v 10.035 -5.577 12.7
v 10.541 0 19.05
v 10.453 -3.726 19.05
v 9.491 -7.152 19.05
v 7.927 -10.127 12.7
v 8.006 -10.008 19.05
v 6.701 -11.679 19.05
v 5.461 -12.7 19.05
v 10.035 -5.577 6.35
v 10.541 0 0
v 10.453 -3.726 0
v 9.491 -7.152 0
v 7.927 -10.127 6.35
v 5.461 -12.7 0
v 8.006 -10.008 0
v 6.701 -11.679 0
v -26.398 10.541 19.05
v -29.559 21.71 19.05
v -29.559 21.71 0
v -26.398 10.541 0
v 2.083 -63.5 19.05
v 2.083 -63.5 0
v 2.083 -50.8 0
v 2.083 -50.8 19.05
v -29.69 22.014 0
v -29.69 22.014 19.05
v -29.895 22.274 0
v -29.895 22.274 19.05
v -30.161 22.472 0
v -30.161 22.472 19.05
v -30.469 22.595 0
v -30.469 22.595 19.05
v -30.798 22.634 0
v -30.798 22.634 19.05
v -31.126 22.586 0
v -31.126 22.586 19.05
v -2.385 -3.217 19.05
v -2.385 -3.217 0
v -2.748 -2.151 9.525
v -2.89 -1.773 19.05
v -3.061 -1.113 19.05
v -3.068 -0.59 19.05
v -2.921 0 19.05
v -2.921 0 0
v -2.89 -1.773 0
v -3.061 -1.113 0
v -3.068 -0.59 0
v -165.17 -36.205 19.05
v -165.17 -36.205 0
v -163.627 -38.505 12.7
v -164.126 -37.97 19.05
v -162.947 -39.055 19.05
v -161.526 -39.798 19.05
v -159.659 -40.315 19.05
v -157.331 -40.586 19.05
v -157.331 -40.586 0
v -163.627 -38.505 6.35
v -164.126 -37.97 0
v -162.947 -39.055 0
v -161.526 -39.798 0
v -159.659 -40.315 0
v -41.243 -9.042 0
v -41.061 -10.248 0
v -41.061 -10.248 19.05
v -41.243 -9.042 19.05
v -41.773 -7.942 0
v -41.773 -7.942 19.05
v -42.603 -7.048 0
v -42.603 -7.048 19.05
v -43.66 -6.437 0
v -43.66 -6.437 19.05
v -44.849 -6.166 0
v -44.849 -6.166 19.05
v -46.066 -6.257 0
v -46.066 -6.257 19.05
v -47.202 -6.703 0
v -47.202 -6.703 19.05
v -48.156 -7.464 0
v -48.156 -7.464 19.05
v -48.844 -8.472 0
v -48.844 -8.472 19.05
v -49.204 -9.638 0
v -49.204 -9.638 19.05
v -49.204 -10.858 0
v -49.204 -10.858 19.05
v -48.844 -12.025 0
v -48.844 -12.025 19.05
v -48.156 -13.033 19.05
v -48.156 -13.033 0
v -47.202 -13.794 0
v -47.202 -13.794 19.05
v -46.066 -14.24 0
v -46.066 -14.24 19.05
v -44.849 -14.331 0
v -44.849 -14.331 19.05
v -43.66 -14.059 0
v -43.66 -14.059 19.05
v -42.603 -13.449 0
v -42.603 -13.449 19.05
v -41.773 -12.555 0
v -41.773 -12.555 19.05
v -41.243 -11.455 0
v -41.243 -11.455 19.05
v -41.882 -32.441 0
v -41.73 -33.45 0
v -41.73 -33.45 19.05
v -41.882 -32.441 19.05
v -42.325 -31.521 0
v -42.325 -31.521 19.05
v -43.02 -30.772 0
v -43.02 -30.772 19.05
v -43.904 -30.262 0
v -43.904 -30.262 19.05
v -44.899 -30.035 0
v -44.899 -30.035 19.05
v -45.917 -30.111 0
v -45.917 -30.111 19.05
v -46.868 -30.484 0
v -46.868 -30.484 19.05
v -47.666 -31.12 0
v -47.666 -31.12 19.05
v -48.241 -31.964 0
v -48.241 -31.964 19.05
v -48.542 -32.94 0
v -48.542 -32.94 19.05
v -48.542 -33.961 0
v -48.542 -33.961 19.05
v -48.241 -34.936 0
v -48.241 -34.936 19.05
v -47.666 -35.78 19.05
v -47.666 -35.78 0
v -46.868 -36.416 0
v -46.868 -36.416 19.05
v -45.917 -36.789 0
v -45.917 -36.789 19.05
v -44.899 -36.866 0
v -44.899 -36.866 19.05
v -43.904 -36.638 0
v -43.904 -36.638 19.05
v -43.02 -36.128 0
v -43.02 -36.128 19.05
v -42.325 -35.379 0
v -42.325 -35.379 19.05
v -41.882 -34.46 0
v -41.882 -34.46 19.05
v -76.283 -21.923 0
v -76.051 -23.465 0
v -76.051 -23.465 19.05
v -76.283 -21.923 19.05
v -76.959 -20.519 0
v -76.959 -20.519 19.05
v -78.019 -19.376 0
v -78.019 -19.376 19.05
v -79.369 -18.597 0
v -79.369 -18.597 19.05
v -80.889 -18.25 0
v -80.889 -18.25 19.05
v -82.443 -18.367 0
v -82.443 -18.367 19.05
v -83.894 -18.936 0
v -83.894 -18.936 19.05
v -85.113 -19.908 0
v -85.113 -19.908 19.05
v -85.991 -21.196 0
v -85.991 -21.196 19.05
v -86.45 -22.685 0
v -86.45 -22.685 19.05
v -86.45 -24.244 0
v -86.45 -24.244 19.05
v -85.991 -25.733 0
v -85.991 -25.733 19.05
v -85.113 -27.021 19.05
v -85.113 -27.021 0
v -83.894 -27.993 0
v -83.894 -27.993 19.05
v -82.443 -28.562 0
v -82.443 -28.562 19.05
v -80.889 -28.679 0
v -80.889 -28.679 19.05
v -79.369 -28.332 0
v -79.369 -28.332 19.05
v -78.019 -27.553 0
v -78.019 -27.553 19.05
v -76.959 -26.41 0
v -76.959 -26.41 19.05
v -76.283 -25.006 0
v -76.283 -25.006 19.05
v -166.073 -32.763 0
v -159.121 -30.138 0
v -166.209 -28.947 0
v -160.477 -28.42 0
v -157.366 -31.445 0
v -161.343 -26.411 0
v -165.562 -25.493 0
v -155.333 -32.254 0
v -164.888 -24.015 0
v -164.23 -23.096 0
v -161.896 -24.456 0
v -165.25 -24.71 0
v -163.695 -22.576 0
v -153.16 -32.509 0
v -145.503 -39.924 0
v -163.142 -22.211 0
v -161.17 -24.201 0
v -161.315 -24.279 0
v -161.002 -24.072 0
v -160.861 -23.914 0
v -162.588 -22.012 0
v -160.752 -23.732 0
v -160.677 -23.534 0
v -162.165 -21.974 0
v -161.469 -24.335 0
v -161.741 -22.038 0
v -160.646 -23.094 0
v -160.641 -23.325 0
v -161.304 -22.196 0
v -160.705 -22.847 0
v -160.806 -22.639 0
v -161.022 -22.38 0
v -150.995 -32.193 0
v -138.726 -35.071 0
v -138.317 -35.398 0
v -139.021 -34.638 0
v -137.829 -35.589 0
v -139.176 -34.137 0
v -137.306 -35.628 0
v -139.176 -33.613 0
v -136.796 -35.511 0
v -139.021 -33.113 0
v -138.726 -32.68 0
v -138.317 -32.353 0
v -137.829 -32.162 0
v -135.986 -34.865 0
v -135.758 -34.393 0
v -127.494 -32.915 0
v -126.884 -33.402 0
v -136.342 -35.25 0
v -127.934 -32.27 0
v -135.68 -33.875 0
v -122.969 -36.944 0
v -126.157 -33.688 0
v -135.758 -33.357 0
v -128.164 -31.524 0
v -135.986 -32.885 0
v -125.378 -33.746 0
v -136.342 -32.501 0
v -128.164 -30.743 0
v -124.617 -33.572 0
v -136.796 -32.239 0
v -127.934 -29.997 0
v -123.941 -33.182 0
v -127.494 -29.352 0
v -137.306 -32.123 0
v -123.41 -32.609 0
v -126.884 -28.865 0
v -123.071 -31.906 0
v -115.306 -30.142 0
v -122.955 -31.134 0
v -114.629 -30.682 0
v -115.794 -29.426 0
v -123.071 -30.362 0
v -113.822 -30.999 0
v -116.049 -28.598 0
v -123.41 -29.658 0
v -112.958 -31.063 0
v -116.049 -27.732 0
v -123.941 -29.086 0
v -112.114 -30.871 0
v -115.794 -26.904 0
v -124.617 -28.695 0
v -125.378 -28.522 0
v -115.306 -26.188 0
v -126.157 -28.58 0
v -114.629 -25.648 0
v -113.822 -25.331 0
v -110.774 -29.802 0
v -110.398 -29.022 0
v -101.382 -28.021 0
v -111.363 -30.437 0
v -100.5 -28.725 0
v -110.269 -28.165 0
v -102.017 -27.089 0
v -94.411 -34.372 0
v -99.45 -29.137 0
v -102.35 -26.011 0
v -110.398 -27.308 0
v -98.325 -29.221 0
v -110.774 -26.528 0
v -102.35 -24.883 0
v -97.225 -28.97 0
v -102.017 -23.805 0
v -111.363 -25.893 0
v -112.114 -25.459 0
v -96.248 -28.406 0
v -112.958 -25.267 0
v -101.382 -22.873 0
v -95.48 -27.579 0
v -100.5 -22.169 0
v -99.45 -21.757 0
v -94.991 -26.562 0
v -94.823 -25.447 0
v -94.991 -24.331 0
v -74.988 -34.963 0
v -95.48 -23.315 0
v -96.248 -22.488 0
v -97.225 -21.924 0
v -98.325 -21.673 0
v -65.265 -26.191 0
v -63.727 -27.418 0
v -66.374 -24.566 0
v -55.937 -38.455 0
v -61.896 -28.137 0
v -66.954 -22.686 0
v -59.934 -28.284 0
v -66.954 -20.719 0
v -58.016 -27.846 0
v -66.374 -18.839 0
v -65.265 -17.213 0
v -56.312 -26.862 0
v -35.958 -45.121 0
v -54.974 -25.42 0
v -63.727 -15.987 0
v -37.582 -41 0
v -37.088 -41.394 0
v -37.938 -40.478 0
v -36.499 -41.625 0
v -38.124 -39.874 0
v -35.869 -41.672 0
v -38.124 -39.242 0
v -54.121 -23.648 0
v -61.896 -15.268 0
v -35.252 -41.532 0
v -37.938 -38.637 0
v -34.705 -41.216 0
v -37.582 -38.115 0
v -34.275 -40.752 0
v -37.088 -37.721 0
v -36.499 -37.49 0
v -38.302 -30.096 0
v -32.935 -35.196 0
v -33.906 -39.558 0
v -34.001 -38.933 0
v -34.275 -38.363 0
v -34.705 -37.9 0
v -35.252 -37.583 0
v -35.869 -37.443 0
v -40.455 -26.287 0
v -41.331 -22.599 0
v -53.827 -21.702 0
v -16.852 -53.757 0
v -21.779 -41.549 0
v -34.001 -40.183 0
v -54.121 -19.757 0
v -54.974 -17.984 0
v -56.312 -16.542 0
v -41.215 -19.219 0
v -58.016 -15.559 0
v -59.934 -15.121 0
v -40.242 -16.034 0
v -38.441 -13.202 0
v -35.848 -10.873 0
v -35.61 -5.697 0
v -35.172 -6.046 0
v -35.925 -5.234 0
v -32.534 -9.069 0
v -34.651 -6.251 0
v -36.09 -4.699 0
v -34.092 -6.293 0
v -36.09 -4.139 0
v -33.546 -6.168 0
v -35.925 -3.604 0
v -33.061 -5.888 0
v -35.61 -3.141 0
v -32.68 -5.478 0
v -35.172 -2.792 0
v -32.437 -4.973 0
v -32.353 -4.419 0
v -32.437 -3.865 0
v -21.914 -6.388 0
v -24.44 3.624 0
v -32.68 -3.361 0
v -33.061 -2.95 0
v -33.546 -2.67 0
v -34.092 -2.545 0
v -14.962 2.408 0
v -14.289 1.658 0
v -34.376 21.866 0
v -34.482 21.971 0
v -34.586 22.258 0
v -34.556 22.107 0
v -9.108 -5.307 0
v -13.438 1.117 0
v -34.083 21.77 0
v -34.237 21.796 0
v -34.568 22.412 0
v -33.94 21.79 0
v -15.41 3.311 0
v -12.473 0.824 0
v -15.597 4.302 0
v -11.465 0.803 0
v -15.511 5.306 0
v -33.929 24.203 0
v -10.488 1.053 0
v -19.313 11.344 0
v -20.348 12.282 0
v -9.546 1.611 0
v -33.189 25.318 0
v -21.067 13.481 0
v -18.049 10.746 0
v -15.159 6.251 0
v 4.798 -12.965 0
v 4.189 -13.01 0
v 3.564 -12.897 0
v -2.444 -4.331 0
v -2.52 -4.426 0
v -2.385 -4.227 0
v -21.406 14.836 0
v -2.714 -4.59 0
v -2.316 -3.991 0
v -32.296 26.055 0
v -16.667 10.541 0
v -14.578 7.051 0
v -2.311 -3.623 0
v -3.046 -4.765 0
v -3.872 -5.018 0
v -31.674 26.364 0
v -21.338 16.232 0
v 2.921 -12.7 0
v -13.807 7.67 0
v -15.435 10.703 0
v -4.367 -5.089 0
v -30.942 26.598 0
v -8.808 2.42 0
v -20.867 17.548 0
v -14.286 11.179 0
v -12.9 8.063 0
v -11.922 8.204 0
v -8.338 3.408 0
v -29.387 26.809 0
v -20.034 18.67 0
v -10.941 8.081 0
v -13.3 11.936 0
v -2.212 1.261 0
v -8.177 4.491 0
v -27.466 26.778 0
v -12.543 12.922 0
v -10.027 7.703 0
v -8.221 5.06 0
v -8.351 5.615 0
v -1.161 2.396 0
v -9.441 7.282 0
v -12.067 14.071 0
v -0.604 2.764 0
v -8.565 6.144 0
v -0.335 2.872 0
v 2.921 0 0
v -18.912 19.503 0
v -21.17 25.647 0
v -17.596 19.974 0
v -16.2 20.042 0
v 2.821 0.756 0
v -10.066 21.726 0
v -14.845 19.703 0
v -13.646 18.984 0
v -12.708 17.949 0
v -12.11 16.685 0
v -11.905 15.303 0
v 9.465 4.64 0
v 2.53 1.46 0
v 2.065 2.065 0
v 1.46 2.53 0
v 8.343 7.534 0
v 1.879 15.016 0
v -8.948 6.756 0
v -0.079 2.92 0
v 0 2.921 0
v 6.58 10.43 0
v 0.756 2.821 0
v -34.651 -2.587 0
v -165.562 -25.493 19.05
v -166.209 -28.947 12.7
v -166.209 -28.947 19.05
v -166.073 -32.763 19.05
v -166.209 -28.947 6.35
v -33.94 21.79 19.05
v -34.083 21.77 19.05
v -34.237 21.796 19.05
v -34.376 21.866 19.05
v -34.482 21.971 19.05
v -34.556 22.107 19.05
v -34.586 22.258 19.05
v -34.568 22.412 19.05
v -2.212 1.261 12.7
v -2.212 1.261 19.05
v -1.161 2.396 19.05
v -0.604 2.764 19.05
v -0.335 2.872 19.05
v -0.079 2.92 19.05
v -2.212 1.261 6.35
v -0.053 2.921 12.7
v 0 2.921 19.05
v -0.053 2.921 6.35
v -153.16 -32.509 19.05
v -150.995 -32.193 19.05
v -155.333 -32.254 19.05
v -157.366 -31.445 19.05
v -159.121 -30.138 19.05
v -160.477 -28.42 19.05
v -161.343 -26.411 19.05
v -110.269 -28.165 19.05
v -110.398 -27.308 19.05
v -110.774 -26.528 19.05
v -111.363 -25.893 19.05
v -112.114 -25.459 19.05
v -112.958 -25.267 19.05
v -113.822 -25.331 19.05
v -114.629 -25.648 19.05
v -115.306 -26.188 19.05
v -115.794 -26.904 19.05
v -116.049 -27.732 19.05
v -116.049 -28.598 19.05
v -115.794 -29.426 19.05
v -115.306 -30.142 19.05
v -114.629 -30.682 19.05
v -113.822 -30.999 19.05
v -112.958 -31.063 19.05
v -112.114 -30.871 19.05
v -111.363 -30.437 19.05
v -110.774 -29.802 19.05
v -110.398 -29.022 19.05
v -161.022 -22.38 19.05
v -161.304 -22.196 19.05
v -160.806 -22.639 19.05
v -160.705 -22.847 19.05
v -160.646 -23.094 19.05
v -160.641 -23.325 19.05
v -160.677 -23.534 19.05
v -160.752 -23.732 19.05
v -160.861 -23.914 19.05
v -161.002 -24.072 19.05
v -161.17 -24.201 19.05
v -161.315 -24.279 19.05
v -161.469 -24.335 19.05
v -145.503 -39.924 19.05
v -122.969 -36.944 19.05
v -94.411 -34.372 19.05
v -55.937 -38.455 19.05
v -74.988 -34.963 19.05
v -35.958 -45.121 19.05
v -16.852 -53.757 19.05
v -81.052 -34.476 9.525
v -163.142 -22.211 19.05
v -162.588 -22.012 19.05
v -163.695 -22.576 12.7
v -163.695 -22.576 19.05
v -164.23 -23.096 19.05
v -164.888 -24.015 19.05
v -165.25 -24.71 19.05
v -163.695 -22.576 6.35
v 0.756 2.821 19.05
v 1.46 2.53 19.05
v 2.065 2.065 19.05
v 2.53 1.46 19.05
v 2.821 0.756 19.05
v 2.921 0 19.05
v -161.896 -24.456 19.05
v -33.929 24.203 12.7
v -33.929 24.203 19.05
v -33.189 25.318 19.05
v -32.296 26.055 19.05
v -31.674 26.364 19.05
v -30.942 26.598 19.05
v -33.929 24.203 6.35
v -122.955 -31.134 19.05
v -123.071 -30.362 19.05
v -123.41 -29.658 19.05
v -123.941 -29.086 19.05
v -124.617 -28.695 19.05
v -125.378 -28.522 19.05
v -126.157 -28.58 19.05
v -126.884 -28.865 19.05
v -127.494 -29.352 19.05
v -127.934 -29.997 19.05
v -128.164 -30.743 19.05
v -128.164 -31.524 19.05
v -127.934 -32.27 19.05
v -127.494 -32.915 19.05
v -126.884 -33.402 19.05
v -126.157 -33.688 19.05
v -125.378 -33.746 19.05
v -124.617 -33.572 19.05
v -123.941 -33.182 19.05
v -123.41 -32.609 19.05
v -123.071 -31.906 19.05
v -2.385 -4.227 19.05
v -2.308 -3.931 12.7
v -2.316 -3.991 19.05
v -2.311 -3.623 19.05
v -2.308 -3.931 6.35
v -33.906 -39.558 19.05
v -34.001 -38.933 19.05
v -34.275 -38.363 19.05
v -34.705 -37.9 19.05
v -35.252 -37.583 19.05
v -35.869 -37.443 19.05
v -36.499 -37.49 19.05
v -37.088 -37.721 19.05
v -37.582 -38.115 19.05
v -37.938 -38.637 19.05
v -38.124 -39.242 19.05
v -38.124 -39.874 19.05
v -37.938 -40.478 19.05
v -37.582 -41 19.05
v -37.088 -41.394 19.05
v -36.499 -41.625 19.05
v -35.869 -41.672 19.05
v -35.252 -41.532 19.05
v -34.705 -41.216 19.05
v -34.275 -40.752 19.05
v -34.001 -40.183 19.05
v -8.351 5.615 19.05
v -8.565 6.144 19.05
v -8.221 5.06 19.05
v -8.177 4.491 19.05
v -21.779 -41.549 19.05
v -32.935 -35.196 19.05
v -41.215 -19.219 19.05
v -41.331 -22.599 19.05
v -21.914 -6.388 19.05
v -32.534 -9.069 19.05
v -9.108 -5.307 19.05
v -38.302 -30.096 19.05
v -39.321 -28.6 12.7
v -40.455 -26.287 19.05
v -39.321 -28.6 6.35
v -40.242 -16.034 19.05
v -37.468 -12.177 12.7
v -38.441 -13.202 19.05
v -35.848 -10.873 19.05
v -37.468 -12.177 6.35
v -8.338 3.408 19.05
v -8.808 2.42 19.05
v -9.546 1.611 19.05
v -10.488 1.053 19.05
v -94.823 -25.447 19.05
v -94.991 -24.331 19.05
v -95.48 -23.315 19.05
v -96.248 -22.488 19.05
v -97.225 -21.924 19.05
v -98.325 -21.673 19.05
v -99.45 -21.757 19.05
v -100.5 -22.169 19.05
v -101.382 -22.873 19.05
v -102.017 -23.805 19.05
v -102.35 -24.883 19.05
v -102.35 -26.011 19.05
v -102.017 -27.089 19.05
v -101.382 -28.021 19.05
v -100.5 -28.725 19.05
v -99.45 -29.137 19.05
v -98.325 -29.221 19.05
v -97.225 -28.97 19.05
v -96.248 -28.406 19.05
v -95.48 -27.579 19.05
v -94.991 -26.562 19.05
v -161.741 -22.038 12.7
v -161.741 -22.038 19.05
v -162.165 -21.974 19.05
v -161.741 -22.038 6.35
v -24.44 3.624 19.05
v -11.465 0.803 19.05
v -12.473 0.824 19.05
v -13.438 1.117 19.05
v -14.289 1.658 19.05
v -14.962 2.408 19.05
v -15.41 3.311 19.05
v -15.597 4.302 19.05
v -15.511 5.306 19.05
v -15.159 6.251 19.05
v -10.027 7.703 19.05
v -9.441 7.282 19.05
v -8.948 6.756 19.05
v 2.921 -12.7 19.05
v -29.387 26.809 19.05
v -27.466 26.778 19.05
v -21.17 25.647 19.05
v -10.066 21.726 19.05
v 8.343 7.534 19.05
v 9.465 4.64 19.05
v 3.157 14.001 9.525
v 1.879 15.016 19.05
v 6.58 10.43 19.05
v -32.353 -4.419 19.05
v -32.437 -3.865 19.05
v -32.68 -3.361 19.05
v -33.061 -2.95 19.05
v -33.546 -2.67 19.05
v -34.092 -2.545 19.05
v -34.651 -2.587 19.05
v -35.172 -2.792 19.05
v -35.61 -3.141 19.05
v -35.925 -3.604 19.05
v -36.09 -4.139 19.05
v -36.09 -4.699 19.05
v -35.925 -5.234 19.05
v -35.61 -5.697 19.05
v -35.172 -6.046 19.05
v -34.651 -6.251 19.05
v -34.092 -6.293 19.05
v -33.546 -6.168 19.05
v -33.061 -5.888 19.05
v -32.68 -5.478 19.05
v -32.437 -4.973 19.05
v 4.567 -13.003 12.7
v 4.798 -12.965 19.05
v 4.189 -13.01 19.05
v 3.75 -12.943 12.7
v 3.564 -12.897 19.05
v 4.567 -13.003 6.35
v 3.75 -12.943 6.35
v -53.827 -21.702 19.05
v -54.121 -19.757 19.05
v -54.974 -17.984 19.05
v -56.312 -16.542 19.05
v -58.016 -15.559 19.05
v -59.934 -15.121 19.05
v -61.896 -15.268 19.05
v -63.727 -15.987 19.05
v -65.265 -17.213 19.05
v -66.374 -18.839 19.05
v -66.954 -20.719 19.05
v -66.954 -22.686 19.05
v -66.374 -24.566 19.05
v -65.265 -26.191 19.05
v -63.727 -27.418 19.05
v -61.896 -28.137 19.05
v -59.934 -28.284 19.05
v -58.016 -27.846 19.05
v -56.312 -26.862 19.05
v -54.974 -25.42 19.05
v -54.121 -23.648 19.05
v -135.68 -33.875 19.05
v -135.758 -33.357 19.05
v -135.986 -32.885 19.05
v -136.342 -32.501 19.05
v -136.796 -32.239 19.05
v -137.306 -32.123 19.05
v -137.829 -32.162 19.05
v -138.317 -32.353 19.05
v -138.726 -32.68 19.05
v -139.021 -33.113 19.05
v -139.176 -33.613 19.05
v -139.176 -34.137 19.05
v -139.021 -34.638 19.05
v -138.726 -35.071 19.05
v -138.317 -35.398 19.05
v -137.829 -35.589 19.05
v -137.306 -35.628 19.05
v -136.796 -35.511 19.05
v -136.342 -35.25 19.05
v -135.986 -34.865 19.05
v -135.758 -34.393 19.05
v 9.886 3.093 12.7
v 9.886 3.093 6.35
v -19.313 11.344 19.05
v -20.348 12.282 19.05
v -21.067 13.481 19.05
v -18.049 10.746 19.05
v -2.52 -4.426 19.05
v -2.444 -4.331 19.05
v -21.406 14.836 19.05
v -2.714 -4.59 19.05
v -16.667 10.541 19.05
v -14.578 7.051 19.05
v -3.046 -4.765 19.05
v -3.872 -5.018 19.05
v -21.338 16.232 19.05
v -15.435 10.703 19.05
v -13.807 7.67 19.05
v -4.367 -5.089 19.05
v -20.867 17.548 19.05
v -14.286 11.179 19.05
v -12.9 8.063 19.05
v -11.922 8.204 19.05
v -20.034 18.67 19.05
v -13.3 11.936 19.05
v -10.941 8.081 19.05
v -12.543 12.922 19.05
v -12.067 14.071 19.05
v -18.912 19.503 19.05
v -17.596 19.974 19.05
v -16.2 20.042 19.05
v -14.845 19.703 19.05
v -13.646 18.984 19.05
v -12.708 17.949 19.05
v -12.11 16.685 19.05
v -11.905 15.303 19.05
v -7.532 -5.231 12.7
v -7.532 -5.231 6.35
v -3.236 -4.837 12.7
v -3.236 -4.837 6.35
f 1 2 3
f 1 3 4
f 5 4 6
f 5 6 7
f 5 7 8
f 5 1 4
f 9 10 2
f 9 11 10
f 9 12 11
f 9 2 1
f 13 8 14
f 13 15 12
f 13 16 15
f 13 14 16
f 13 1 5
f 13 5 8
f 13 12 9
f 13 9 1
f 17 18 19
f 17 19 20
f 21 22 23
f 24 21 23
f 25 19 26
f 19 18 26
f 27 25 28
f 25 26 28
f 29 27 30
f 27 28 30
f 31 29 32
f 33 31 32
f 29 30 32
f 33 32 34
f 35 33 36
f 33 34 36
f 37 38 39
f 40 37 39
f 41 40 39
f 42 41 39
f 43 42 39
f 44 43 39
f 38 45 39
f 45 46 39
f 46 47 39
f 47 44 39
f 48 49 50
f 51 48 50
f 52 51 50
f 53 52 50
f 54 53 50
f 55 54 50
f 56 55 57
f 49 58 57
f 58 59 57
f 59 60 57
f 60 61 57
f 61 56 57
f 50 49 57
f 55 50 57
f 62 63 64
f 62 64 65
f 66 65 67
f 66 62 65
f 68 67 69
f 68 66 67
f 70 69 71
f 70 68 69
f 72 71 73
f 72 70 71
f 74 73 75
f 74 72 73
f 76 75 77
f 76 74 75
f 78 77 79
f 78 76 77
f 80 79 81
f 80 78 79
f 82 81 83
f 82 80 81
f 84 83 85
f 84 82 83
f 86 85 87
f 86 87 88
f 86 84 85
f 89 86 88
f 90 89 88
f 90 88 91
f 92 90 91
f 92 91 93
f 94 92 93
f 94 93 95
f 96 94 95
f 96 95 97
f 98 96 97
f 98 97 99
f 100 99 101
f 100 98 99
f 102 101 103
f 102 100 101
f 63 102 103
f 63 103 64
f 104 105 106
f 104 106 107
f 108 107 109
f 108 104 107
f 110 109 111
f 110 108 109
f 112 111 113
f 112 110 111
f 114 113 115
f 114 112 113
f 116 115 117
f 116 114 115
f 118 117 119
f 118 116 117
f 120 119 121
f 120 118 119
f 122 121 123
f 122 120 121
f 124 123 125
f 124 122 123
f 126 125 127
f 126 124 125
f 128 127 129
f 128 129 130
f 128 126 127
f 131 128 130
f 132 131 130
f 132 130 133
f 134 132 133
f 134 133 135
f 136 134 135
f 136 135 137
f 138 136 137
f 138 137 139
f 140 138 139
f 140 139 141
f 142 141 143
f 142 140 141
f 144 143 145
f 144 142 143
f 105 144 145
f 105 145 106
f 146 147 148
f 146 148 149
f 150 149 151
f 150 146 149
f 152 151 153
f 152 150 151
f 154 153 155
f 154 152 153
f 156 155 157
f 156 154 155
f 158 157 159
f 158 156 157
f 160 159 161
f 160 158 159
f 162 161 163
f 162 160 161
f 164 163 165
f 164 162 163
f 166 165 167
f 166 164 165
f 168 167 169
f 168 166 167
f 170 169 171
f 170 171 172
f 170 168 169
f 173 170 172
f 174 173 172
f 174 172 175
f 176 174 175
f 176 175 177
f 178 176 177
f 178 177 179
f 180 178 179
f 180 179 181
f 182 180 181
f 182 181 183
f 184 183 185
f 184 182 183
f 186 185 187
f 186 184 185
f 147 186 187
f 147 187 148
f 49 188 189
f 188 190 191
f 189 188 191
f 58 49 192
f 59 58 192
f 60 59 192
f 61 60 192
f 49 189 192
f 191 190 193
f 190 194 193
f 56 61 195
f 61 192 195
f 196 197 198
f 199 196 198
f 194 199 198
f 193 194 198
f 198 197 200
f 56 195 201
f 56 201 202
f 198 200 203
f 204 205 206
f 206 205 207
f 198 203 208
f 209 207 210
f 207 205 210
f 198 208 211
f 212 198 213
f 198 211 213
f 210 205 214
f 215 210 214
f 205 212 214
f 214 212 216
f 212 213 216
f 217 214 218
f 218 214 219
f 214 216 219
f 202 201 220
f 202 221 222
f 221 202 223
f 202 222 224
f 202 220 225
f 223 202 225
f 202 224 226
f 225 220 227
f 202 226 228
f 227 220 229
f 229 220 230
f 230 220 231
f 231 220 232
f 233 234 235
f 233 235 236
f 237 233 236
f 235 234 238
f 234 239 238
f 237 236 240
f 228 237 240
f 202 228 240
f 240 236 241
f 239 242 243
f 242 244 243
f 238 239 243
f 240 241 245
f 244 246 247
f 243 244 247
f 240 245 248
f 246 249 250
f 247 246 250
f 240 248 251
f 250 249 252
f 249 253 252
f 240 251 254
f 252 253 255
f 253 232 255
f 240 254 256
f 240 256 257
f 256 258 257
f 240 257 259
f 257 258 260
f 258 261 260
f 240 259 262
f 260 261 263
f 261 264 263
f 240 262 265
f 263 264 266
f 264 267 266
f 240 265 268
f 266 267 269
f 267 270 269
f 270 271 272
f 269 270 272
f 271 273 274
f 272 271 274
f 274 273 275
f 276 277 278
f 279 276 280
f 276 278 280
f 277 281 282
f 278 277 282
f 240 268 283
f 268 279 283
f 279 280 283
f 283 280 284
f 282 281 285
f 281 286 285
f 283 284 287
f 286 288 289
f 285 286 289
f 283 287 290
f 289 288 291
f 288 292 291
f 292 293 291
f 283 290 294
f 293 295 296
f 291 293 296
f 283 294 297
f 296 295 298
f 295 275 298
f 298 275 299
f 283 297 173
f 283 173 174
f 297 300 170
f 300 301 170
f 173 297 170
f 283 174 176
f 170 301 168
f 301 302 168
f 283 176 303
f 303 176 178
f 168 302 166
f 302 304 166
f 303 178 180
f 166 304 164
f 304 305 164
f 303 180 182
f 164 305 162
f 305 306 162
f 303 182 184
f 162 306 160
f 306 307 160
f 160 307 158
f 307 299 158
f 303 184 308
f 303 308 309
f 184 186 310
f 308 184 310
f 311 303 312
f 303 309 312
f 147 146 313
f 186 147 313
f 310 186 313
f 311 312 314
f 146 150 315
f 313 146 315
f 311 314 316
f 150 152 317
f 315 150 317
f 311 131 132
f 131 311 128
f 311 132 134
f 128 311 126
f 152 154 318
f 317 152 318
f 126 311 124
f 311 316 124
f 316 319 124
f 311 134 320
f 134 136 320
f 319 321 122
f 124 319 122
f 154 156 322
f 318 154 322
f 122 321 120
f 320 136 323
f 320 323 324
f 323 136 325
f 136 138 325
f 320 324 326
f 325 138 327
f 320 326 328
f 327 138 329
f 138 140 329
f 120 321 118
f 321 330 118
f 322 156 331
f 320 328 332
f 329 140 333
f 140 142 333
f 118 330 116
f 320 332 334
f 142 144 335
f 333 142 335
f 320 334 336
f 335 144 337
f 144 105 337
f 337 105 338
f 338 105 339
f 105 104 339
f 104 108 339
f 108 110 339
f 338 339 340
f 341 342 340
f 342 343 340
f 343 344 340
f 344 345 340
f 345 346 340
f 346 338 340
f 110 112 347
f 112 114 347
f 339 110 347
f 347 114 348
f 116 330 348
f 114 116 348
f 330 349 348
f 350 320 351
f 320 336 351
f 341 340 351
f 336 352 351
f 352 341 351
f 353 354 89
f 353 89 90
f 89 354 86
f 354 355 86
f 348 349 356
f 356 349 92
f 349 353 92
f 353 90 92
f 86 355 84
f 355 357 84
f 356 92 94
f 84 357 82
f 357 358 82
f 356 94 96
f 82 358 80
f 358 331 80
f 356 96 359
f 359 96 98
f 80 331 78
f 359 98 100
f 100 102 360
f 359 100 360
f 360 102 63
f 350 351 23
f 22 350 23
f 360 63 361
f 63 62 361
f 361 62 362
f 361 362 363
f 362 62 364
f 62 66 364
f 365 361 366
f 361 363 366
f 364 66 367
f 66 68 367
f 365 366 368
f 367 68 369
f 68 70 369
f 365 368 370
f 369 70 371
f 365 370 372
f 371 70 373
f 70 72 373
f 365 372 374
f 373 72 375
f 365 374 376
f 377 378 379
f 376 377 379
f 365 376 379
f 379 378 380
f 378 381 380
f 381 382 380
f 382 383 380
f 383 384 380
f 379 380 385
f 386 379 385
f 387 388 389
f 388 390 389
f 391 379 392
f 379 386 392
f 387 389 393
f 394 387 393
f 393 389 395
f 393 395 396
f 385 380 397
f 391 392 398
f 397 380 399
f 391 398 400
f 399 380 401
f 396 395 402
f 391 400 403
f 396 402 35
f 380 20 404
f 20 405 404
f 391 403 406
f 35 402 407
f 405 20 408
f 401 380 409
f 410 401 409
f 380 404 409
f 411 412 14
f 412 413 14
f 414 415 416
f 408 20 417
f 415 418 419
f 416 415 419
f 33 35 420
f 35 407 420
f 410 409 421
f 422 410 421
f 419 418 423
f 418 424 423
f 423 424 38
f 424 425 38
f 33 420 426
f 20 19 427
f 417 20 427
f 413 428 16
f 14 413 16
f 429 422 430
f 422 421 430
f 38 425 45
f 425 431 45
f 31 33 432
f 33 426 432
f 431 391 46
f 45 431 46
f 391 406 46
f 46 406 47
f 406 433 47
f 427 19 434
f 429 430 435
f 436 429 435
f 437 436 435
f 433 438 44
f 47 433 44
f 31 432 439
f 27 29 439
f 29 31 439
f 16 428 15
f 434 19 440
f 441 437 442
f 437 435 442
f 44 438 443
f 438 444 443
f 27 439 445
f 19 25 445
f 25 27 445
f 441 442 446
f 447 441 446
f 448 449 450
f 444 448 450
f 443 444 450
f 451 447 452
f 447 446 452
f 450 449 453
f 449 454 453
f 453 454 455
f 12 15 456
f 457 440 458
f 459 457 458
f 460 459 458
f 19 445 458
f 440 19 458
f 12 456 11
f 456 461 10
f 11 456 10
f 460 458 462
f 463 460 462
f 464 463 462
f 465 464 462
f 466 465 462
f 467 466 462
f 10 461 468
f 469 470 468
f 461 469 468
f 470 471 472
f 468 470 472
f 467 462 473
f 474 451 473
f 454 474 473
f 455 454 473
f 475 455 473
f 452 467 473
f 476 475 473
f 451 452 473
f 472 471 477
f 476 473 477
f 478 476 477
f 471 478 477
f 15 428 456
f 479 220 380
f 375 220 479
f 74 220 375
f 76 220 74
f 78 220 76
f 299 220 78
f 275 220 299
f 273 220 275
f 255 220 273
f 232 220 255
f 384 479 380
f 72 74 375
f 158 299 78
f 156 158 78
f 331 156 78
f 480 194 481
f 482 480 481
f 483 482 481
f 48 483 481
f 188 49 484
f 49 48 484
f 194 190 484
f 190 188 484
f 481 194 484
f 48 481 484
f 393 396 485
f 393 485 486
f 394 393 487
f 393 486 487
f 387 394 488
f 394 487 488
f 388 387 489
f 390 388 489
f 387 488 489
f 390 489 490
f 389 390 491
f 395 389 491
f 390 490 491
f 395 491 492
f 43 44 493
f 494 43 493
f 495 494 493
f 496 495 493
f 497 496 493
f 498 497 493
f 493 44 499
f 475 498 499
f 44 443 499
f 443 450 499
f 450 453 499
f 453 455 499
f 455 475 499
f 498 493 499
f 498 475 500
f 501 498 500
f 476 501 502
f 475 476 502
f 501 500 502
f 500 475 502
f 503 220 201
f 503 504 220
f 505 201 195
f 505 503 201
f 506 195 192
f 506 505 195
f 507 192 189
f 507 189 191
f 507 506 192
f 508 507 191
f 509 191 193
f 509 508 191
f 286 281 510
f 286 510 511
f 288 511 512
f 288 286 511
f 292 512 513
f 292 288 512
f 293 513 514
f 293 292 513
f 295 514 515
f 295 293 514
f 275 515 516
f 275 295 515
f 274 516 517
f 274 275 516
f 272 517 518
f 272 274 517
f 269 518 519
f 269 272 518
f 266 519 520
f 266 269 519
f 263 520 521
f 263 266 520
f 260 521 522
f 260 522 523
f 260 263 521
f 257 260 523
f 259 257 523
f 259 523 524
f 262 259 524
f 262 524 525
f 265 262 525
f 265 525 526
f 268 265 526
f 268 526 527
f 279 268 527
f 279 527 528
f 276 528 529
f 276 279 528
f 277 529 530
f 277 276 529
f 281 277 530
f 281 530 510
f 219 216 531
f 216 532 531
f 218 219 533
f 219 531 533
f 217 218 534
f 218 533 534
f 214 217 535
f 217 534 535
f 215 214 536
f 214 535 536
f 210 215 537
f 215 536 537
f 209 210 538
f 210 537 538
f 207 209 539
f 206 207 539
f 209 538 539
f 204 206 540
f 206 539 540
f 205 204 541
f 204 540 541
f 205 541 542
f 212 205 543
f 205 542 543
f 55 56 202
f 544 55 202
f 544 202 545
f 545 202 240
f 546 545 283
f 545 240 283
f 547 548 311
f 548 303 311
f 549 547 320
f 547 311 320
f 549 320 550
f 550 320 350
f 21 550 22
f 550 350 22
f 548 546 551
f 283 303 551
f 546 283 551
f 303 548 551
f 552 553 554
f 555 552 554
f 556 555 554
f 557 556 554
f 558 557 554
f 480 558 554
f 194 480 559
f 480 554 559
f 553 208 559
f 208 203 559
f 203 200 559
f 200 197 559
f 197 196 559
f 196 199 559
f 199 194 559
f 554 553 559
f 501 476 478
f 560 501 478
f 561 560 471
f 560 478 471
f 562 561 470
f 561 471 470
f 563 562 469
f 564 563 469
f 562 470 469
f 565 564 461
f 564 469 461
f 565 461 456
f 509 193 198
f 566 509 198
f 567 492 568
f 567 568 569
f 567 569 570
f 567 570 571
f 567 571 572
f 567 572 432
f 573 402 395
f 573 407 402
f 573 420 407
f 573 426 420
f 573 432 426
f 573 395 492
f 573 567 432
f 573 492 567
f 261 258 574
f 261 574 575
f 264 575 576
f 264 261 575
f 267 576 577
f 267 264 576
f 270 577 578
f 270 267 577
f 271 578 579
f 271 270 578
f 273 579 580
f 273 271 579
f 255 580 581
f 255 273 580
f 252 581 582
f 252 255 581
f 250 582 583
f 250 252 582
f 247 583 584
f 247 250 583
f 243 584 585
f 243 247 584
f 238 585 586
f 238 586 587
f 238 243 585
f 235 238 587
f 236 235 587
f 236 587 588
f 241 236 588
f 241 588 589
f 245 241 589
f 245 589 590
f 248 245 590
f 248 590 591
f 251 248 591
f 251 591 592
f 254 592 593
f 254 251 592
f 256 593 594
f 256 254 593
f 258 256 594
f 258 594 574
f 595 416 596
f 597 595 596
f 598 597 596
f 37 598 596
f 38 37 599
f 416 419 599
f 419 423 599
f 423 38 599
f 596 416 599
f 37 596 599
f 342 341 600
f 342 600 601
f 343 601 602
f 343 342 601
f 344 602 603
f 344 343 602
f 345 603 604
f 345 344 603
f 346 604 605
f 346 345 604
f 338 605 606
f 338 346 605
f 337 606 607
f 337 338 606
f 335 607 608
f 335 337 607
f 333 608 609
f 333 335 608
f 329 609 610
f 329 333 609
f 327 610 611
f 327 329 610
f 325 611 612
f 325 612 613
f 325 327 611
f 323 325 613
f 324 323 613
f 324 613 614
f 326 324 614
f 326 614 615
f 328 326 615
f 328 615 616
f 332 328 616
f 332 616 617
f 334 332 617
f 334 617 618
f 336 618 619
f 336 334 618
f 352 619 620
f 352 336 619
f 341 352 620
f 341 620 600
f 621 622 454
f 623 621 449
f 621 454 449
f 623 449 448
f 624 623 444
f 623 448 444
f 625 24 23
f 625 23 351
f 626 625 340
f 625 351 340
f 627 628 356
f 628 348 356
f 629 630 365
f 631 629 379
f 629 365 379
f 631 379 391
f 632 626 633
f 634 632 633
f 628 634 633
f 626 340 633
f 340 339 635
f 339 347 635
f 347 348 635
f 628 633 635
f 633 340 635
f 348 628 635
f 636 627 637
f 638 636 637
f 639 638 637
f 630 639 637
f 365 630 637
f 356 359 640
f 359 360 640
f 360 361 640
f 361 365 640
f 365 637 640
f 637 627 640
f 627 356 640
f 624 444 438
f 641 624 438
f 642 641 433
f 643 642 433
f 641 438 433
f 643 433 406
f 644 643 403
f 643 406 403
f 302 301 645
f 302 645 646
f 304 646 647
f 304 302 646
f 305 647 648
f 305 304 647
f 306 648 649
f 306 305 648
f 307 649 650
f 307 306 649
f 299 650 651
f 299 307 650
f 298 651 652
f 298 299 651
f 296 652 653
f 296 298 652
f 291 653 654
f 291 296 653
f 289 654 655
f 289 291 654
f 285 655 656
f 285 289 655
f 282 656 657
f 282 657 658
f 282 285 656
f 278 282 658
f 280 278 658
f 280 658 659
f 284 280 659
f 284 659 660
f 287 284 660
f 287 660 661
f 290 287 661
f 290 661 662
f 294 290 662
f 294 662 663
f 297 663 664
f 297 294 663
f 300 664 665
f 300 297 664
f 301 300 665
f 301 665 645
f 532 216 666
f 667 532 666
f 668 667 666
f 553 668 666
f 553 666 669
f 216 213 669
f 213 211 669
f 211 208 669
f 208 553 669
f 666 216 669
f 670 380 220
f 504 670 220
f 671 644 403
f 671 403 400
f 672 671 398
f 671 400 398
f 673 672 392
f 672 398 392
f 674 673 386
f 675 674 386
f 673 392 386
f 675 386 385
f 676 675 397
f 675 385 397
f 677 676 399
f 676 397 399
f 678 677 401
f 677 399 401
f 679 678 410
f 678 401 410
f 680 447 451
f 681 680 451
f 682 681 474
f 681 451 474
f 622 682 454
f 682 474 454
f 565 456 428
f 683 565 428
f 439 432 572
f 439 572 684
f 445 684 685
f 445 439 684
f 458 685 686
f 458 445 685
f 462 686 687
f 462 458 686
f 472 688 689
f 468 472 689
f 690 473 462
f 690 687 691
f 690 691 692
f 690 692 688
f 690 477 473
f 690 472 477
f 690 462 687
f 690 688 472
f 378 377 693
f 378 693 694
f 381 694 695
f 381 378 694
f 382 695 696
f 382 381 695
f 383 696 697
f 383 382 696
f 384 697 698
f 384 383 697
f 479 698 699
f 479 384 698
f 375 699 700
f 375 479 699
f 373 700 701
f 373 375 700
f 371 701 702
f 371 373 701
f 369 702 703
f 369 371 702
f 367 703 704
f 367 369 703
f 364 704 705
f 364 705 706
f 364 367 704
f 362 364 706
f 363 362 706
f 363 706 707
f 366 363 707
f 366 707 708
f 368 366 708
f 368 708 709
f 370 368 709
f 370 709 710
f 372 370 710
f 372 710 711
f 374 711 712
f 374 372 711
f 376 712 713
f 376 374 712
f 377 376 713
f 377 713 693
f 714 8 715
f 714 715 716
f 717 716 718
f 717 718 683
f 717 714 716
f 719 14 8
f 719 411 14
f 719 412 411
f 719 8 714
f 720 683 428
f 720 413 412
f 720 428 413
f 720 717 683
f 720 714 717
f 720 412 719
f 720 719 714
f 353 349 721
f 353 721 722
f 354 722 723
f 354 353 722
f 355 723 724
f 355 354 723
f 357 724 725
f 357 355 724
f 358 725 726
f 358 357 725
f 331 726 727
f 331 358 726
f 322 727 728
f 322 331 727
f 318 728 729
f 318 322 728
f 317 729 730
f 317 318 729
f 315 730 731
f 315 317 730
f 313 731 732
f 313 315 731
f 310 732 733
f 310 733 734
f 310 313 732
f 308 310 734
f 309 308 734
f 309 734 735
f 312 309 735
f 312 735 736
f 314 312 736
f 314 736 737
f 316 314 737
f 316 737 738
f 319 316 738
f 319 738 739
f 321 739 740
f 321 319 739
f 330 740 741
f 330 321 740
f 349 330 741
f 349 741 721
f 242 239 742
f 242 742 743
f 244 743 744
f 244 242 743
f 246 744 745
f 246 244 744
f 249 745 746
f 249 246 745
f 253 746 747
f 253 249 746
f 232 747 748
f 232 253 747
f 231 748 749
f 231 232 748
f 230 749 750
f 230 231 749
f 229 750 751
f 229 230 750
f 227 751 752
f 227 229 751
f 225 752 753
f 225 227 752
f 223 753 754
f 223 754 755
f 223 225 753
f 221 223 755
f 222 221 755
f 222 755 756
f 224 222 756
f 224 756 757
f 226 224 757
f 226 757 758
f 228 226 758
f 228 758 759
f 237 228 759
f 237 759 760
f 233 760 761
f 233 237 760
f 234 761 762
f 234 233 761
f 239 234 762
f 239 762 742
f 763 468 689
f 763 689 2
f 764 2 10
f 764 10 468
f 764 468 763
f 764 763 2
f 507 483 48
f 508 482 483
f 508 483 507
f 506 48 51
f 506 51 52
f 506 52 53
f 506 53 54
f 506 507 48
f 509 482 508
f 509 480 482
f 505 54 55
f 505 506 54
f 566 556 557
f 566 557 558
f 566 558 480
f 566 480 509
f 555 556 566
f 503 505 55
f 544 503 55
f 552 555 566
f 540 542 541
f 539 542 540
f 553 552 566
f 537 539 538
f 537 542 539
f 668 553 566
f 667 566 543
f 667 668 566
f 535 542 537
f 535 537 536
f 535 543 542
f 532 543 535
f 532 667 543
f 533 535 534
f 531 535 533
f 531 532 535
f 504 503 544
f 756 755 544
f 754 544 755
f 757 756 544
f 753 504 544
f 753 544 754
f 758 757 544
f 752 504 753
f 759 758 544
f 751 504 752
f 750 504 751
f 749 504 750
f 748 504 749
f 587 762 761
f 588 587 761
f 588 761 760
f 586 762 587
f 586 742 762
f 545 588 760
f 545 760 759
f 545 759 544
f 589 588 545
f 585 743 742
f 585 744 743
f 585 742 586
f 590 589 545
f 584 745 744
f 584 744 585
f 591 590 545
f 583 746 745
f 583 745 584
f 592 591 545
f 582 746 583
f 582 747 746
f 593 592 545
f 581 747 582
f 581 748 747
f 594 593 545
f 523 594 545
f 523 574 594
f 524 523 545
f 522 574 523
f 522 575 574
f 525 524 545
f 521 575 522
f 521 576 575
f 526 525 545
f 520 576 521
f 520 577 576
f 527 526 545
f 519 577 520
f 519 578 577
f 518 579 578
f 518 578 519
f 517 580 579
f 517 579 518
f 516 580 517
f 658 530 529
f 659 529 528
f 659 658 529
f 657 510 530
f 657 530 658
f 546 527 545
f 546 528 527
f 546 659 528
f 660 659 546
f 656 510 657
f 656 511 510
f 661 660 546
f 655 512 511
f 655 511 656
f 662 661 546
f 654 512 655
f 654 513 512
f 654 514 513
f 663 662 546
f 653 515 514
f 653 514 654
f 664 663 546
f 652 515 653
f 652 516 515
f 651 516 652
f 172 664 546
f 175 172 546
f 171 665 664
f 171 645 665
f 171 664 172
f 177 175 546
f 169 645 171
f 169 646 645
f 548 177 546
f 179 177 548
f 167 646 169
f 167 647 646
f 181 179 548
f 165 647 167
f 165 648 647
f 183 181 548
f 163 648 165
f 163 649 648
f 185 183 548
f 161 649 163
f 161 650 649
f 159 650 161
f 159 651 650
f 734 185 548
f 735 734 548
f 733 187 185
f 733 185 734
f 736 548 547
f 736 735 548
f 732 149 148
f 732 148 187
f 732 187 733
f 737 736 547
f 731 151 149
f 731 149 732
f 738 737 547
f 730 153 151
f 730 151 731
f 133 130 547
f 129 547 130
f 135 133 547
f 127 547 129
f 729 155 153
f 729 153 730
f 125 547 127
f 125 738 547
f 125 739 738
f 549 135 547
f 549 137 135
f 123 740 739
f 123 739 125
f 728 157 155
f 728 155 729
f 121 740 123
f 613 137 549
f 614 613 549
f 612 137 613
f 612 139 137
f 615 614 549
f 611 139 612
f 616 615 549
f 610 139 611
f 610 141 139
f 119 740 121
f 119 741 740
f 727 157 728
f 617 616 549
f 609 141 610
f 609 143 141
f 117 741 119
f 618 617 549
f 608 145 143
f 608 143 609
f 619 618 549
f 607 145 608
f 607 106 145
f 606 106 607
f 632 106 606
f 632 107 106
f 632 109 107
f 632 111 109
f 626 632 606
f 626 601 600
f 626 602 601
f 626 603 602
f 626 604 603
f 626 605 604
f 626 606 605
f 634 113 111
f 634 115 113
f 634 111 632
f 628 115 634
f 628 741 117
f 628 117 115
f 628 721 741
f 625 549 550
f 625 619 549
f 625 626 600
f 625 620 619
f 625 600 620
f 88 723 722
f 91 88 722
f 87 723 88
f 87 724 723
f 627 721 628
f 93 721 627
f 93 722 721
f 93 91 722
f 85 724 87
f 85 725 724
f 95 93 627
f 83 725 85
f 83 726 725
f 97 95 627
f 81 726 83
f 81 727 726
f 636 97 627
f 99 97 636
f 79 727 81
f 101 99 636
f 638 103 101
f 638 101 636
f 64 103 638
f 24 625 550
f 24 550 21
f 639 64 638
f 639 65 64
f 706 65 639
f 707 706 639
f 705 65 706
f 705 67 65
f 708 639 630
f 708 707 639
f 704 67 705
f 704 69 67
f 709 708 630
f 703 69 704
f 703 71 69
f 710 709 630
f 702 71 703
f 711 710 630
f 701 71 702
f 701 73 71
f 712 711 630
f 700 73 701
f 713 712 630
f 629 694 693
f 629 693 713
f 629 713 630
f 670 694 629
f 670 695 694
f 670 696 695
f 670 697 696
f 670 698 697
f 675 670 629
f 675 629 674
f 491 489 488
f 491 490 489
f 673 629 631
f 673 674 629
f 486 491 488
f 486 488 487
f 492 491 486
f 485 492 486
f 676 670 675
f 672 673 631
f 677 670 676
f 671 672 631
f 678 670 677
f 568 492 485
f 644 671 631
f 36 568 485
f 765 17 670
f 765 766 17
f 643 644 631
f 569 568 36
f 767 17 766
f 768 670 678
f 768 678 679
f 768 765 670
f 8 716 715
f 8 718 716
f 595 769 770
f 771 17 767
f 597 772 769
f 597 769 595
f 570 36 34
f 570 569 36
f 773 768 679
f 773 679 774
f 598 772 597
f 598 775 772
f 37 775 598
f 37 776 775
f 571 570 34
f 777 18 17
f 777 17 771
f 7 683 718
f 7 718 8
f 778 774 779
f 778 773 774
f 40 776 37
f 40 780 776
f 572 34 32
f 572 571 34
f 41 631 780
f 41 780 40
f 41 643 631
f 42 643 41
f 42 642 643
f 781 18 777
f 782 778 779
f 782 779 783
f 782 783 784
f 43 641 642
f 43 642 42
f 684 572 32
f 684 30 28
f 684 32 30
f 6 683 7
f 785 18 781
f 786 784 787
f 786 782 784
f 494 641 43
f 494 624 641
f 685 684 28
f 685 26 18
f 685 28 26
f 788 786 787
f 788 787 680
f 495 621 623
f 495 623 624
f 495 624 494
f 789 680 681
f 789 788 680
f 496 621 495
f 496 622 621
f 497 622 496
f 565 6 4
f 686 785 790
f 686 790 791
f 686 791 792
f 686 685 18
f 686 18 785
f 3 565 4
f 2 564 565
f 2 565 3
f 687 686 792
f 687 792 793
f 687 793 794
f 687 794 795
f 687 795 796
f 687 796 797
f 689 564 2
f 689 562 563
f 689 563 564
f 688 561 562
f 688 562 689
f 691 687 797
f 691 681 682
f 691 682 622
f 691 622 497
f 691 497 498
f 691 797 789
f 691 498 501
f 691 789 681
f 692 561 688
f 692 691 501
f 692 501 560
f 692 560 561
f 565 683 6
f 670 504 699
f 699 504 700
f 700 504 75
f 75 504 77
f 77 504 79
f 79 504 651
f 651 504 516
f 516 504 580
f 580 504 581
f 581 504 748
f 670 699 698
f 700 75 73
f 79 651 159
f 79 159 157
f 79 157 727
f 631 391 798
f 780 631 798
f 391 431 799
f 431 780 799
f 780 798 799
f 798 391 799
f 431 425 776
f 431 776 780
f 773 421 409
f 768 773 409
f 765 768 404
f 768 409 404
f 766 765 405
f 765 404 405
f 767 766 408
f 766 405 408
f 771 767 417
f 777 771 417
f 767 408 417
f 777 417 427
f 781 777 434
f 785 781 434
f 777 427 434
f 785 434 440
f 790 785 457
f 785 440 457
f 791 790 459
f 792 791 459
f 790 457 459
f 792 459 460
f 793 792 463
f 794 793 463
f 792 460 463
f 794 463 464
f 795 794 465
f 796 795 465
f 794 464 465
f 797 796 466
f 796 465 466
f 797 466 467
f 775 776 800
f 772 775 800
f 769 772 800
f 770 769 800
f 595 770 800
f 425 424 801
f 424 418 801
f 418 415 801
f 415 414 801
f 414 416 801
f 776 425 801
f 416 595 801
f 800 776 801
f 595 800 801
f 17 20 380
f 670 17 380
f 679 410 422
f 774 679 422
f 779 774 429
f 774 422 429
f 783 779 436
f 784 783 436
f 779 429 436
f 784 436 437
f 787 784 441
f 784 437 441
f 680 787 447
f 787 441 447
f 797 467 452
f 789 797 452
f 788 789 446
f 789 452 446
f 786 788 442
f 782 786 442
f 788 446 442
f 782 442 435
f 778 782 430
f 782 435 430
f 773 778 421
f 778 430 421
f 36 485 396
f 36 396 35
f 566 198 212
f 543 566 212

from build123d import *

# Parameters (mm, degrees)
F0_R     = 1.7576231228
F0_R_2   = 2.6194646955
F0_R_3   = 2.9064395042
F0_R_4   = 3.7846862671
F0_R_5   = 5.2290610065
F0_R_6   = 2.1208004667
F0_R_7   = 3.4250228461
F0_R_8   = 6.5999331713
F0_R_9   = 4.0939669446
F0_R_10  = 1.8790687222
F1_DEPTH = 19.05
F2_R     = 8.382
F3_R     = 1.27
F4_R     = 0.508
F5_R     = 2.54
F6_R     = 1.143


# Not quite as in the source:
# - a feature names something its author has since deleted; it is built from what else it names


with BuildPart() as f1:
    # F0 (on Top) → F1 (new body)
    with BuildSketch(Plane.XY):
        with BuildLine():
            Line((10.541, 0), (2.921, 0))
            Line((2.921, 0), (2.921, -10.128200235))
            ThreePointArc((2.921, -10.128200235), (5.467200091, -9.0123473171), (7.633137931, -7.2696551724))
            Line((7.633137931, -7.2696551724), (10.541, 0))
        make_face()
        with BuildLine():
            ThreePointArc((0, 2.921), (2.0654589078, 2.0654589078), (2.921, 0))
            Line((2.921, 0), (10.541, 0))
            add(Edge.make_bspline(
                [(9.4647116957, 4.6402492947), (9.9365749021, 3.093212593), (10.238787451, 1.5466062965), (10.541, 0)],
                knots=[0.8946694577, 0.8946694577, 0.8946694577, 0.8946694577, 1, 1, 1, 1], degree=3))
            ThreePointArc((9.4647116957, 4.6402492947), (5.5767290227, 8.9449859926), (0, 10.541))
            Line((0, 10.541), (0, 2.921))
        make_face()
        with BuildLine():
            add(Edge.make_bspline(
                [(-2.3848635838, -3.2166666053), (-2.4728326484, -2.8639169674), (-2.9207971155, -1.7035058727), (-3.2431227864, -0.8639813892), (-2.921, 0)],
                knots=[0.2535057974, 0.2535057974, 0.2535057974, 0.2535057974, 0.3356664829, 0.509164944, 0.509164944, 0.509164944, 0.509164944], degree=3))
            ThreePointArc((-2.921, 0), (-2.0933427309, 2.0371934643), (-0.0793997186, 2.9199206641))
            add(Edge.make_bspline(
                [(-0.0793997186, 2.9199206641), (-0.0526154408, 2.921489703), (-0.0261396552, 2.9218637368), (0, 2.921)],
                knots=[0.7428905608, 0.7428905608, 0.7428905608, 0.7428905608, 0.749200115, 0.749200115, 0.749200115, 0.749200115], degree=3))
            Line((0, 2.921), (0, 10.541))
            Line((0, 10.541), (-5.5241232696, 8.977568886))
            ThreePointArc((-5.5241232696, 8.977568886), (-7.185645683, 7.7122744453), (-8.5651021417, 6.1442417191))
            ThreePointArc((-8.5651021417, 6.1442417191), (-8.2751102539, 5.3401365451), (-8.1767075611, 4.4910209253))
            ThreePointArc((-8.1767075611, 4.4910209253), (-8.8083299958, 2.4195216624), (-10.4882883034, 1.0528482629))
            ThreePointArc((-10.4882883034, 1.0528482629), (-10.3010896952, -2.2361198743), (-9.1077855872, -5.3066866025))
            add(Edge.make_bspline(
                [(-9.1077855872, -5.3066866025), (-7.4549936416, -5.2237610648), (-5.7884221322, -5.1507653072), (-4.1215360581, -5.0777890942)],
                knots=[0.9571200697, 0.9571200697, 0.9571200697, 0.9571200697, 1, 1, 1, 1], degree=3))
            add(Edge.make_bspline(
                [(-4.1215360581, -5.0777890942), (-3.3682495324, -4.8980809941), (-2.6149630067, -4.7183728941), (-2.3848635838, -4.2266139709)],
                knots=[0, 0, 0, 0, 0.1642422553, 0.1642422553, 0.1642422553, 0.1642422553], degree=3))
            Line((-2.3848635838, -4.2266139709), (-2.3848635838, -3.2166666053))
        make_face()
        with BuildLine():
            ThreePointArc((-0.0793997186, 2.9199206641), (-2.0933427309, 2.0371934643), (-2.921, 0))
            add(Edge.make_bspline(
                [(-2.921, 0), (-2.4870575516, 1.1638984113), (-1.0715731361, 2.8617985559), (-0.0793997186, 2.9199206641)],
                knots=[0.509164944, 0.509164944, 0.509164944, 0.509164944, 0.7428905608, 0.7428905608, 0.7428905608, 0.7428905608], degree=3))
        make_face()
        with BuildLine():
            add(Edge.make_bspline(
                [(-2.3848635838, -4.2266139709), (-2.2598075227, -3.9593493547), (-2.2892895236, -3.5999117297), (-2.3848635838, -3.2166666053)],
                knots=[0.1642422553, 0.1642422553, 0.1642422553, 0.1642422553, 0.2535057974, 0.2535057974, 0.2535057974, 0.2535057974], degree=3))
            Line((-2.3848635838, -3.2166666053), (-2.3848635838, -4.2266139709))
        make_face()
        with BuildLine():
            ThreePointArc((7.633137931, -7.2696551724), (5.467200091, -9.0123473171), (2.921, -10.128200235))
            Line((2.921, -10.128200235), (2.921, -12.7))
            Line((2.921, -12.7), (5.461, -12.7))
            Line((5.461, -12.7), (7.633137931, -7.2696551724))
        make_face()
        with BuildLine():
            ThreePointArc((7.633137931, -7.2696551724), (9.7870727986, -3.9148291194), (10.541, 0))
            Line((10.541, 0), (7.633137931, -7.2696551724))
        make_face()
        with BuildLine():
            add(Edge.make_bspline(
                [(10.541, 0), (11.2509652972, -5.7718935423), (7.6916234008, -11.4340619195), (5.461, -12.7)],
                knots=[0, 0, 0, 0, 0.6988492234, 0.6988492234, 0.6988492234, 0.6988492234], degree=3))
            ThreePointArc((10.541, 0), (9.7870727986, -3.9148291194), (7.633137931, -7.2696551724))
            Line((7.633137931, -7.2696551724), (5.461, -12.7))
        make_face()
        with BuildLine():
            Line((-16.6670959443, 10.541), (0, 10.541))
            ThreePointArc((0, 10.541), (5.5767290227, 8.9449859926), (9.4647116957, 4.6402492947))
            add(Edge.make_bspline(
                [(-30.9420047574, 26.5976409188), (-24.3766956681, 28.1974465791), (3.1561278341, 17.9494181138), (8.5138708016, 7.7576480258), (9.4647116957, 4.6402492947)],
                knots=[0.2011479798, 0.2011479798, 0.2011479798, 0.2011479798, 0.6824202598, 0.8946694577, 0.8946694577, 0.8946694577, 0.8946694577], degree=3))
            Line((-30.9420047574, 26.5976409188), (-29.9044561627, 22.9316358842))
            Line((-29.9044561627, 22.9316358842), (-26.3976724219, 10.541))
            Line((-26.3976724219, 10.541), (-16.6670959443, 10.541))
        make_face()
        with BuildLine():
            ThreePointArc((-11.9050923426, 15.3030036017), (-13.2998509055, 11.9357585629), (-16.6670959443, 10.541))
            ThreePointArc((-16.6670959443, 10.541), (-20.0343409831, 18.6702486405), (-11.9050923426, 15.3030036017))
        make_face(mode=Mode.SUBTRACT)
        with BuildLine():
            Line((-5.5241232696, 8.977568886), (0, 10.541))
            ThreePointArc((0, 10.541), (-2.870551112, 10.142613929), (-5.5241232696, 8.977568886))
        make_face()
        with BuildLine():
            ThreePointArc((-5.5241232696, 8.977568886), (-2.870551112, 10.142613929), (0, 10.541))
            Line((0, 10.541), (-16.6670959443, 10.541))
            Line((-16.6670959443, 10.541), (-26.3976724219, 10.541))
            Line((-26.3976724219, 10.541), (-24.4400335639, 3.6240093687))
            Line((-24.4400335639, 3.6240093687), (-15.1585403449, 6.2508470722))
            ThreePointArc((-15.1585403449, 6.2508470722), (-12.9004660988, 8.0634085442), (-10.0274151455, 7.7030523173))
            Line((-10.0274151455, 7.7030523173), (-5.5241232696, 8.977568886))
        make_face()
        with BuildLine():
            Line((5.461, -12.7), (2.921, -12.7))
            add(Edge.make_bspline(
                [(5.461, -12.7), (4.4997712444, -13.2455228729), (3.7852793191, -12.9746862741), (2.921, -12.7)],
                knots=[0.6988492234, 0.6988492234, 0.6988492234, 0.6988492234, 1, 1, 1, 1], degree=3))
        make_face()
        with BuildLine():
            add(Edge.make_bspline(
                [(2.0828, -50.8), (-15.8735350331, -44.4526794588), (-44.1502352976, -34.2737591947), (-40.756956224, -7.8620336461), (-20.8847334133, -5.8975714593), (-9.1077855872, -5.3066866025)],
                knots=[0, 0, 0, 0, 0.408994296, 0.651579676, 0.9571200697, 0.9571200697, 0.9571200697, 0.9571200697], degree=3))
            ThreePointArc((-9.1077855872, -5.3066866025), (-10.3010896952, -2.2361198743), (-10.4882883034, 1.0528482629))
            ThreePointArc((-10.4882883034, 1.0528482629), (-14.6511436849, 2.009685541), (-15.1585403449, 6.2508470722))
            Line((-15.1585403449, 6.2508470722), (-24.4400335639, 3.6240093687))
            Line((-24.4400335639, 3.6240093687), (-38.5809545016, -0.3781380665))
            Line((-38.5809545016, -0.3781380665), (-134.62, -27.559))
            Line((-134.62, -27.559), (-159.0600335639, -34.4759906313))
            Line((-159.0600335639, -34.4759906313), (-157.3307859061, -40.5859990223))
            add(Edge.make_bspline(
                [(-157.3307859061, -40.5859990223), (-144.0553777211, -41.3698511276), (-73.62744163, -23.7523445291), (-24.481821439, -49.5498829603), (2.0828, -63.5)],
                knots=[0.3634781173, 0.3634781173, 0.3634781173, 0.3634781173, 0.6705750285, 1, 1, 1, 1], degree=3))
            Line((2.0828, -63.5), (2.0828, -50.8))
        make_face()
        with Locations((-137.4377459288, -33.8753685355)):
            Circle(F0_R, mode=Mode.SUBTRACT)
        with Locations((-125.5742162466, -31.133711338)):
            Circle(F0_R_2, mode=Mode.SUBTRACT)
        with Locations((-113.1754145026, -28.1649827957)):
            Circle(F0_R_3, mode=Mode.SUBTRACT)
        with Locations((-98.6075103283, -25.4469309002)):
            Circle(F0_R_4, mode=Mode.SUBTRACT)
        with Locations((-81.2796056271, -23.4645009041)):
            Circle(F0_R_5, mode=Mode.SUBTRACT)
        with Locations((-36.0271334648, -39.5576246083)):
            Circle(F0_R_6, mode=Mode.SUBTRACT)
        with Locations((-45.155338943, -33.4500707686)):
            Circle(F0_R_7, mode=Mode.SUBTRACT)
        with Locations((-60.4273863137, -21.702343598)):
            Circle(F0_R_8, mode=Mode.SUBTRACT)
        with Locations((-45.155338943, -10.2483071387)):
            Circle(F0_R_9, mode=Mode.SUBTRACT)
        with Locations((-34.2323705554, -4.4191675261)):
            Circle(F0_R_10, mode=Mode.SUBTRACT)
        with BuildLine():
            ThreePointArc((-8.5651021417, 6.1442417191), (-7.185645683, 7.7122744453), (-5.5241232696, 8.977568886))
            Line((-5.5241232696, 8.977568886), (-10.0274151455, 7.7030523173))
            ThreePointArc((-10.0274151455, 7.7030523173), (-9.1816607704, 7.0311507523), (-8.5651021417, 6.1442417191))
        make_face()
        with BuildLine():
            Line((-29.9044561627, 22.9316358842), (-30.9420047574, 26.5976409188))
            add(Edge.make_bspline(
                [(-34.7924628755, 21.5482377579), (-34.2392208548, 23.7386195676), (-33.6859788341, 25.9290013773), (-30.9420047574, 26.5976409188)],
                knots=[0, 0, 0, 0, 0.2011479798, 0.2011479798, 0.2011479798, 0.2011479798], degree=3))
            Line((-34.7924628755, 21.5482377579), (-29.9044561627, 22.9316358842))
        make_face()
        with BuildLine():
            add(Edge.make_bspline(
                [(-165.1700419549, -36.2052382891), (-163.9966596031, -38.9594916297), (-161.8785228938, -40.3174759635), (-157.3307859061, -40.5859990223)],
                knots=[0.2582763817, 0.2582763817, 0.2582763817, 0.2582763817, 0.3634781173, 0.3634781173, 0.3634781173, 0.3634781173], degree=3))
            Line((-157.3307859061, -40.5859990223), (-159.0600335639, -34.4759906313))
            Line((-159.0600335639, -34.4759906313), (-165.1700419549, -36.2052382891))
        make_face()
        with BuildLine():
            Line((-165.1700419549, -36.2052382891), (-159.0600335639, -34.4759906313))
            Line((-159.0600335639, -34.4759906313), (-161.8959997228, -24.4555768701))
            Line((-161.8959997228, -24.4555768701), (-165.5620047574, -25.4931254648))
            add(Edge.make_bspline(
                [(-165.5620047574, -25.4931254648), (-166.6062770263, -28.5203024248), (-166.4520124462, -33.1960985126), (-165.1700419549, -36.2052382891)],
                knots=[0.1433389784, 0.1433389784, 0.1433389784, 0.1433389784, 0.2582763817, 0.2582763817, 0.2582763817, 0.2582763817], degree=3))
        make_face()
        with BuildLine():
            Line((-162.5876987859, -22.0115735137), (-161.8959997228, -24.4555768701))
            Line((-161.8959997228, -24.4555768701), (-159.2075960307, -23.6947079006))
            add(Edge.make_bspline(
                [(-159.2075960307, -23.6947079006), (-160.6750664221, -22.4582941647), (-161.5912860772, -21.8038515678), (-162.5876987859, -22.0115735137)],
                knots=[0, 0, 0, 0, 0.0682171341, 0.0682171341, 0.0682171341, 0.0682171341], degree=3))
        make_face()
        with BuildLine():
            Line((-165.5620047574, -25.4931254648), (-161.8959997228, -24.4555768701))
            Line((-161.8959997228, -24.4555768701), (-162.5876987859, -22.0115735137))
            add(Edge.make_bspline(
                [(-162.5876987859, -22.0115735137), (-163.6849650577, -22.2403203804), (-164.8794796913, -23.5145953285), (-165.5620047574, -25.4931254648)],
                knots=[0.0682171341, 0.0682171341, 0.0682171341, 0.0682171341, 0.1433389784, 0.1433389784, 0.1433389784, 0.1433389784], degree=3))
        make_face()
    extrude(amount=F1_DEPTH)

    # F2
    f2_edges = [f1.edges().sort_by_distance(p)[0] for p in [
        (-159.060034, -34.475991, 9.525),
    ]]
    fillet(f2_edges, radius=F2_R)

    # F3
    f3_edges = [f1.edges().sort_by_distance(p)[0] for p in [
        (-29.904456, 22.931636, 9.525),
    ]]
    fillet(f3_edges, radius=F3_R)

    # F4
    f4_edges = [f1.edges().sort_by_distance(p)[0] for p in [
        (-34.792463, 21.548238, 9.525),
    ]]
    fillet(f4_edges, radius=F4_R)

    # F5
    f5_edges = [f1.edges().sort_by_distance(p)[0] for p in [
        (-4.121536, -5.077789, 9.525),
    ]]
    fillet(f5_edges, radius=F5_R)

    # F6
    f6_edges = [f1.edges().sort_by_distance(p)[0] for p in [
        (-159.207596, -23.694708, 9.525),
    ]]
    fillet(f6_edges, radius=F6_R)


solid = f1.part
